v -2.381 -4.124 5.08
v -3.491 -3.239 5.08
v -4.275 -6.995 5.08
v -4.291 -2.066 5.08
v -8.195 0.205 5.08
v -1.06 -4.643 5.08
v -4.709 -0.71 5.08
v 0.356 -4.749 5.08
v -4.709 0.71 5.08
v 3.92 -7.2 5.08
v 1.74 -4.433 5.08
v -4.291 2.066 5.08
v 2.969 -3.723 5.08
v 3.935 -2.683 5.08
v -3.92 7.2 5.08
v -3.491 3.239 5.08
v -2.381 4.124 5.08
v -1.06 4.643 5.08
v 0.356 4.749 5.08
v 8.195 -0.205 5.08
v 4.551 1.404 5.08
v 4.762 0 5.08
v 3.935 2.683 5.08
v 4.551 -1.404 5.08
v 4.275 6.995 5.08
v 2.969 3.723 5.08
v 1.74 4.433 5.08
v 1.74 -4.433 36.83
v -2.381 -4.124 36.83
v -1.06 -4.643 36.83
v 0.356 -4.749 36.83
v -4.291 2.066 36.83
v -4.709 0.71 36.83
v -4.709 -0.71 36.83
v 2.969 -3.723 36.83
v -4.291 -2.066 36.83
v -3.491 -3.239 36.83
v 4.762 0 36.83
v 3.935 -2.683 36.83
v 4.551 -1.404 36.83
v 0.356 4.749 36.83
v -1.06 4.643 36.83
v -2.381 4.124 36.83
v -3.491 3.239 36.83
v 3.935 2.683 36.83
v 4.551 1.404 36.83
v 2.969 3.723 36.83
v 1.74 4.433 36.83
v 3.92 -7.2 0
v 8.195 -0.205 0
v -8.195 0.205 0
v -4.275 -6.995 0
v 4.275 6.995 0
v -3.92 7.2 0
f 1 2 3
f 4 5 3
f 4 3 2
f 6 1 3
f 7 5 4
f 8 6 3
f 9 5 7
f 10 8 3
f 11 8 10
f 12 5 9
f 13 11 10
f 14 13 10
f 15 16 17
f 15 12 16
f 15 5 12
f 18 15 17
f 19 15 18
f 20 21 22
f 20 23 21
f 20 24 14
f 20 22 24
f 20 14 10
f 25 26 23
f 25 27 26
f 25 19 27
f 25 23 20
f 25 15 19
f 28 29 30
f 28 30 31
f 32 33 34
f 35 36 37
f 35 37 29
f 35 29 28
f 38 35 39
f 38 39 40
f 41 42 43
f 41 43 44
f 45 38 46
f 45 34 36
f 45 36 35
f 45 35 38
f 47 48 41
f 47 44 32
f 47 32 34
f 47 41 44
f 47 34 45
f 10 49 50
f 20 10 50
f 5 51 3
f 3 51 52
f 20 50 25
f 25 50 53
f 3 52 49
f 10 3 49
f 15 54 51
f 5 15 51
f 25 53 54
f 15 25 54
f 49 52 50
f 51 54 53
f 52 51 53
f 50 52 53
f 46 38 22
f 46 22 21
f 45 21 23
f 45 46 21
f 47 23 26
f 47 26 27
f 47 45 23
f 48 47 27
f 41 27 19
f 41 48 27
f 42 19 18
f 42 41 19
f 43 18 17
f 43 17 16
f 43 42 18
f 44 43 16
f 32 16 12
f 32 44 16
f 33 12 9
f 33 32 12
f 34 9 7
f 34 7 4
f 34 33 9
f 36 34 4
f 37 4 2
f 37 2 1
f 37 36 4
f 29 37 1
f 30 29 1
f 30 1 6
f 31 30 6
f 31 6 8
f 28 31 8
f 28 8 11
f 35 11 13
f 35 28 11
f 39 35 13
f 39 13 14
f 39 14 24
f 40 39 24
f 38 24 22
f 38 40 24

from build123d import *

# Parameters (mm, degrees)
EXTRUDE1_DEPTH    = 36.83
SKETCH2_OUTSIDE_W = 26.952
SKETCH2_OUTSIDE_H = 24.962
SKETCH2_OUTSIDE_R = 4.7625
EXTRUDE2_DEPTH    = 31.75


with BuildPart() as part:
    # Sketch1 → Extrude1 (new body)
    with BuildSketch(Plane.XY):
        Polygon((4.274924982, 6.994647743), (-3.920080145, 7.199517506), (-8.195005127, 0.204869763), (-4.274924982, -6.994647743), (3.920080145, -7.199517506), (8.195005127, -0.204869763), align=None)
    extrude(amount=EXTRUDE1_DEPTH)

    # Sketch2 outside → Extrude2 (cut)
    with BuildSketch(Plane.XY.offset(36.83)):
        Rectangle(SKETCH2_OUTSIDE_W, SKETCH2_OUTSIDE_H)
        Circle(SKETCH2_OUTSIDE_R, mode=Mode.SUBTRACT)
    extrude(amount=-EXTRUDE2_DEPTH, mode=Mode.SUBTRACT)


solid = part.part
